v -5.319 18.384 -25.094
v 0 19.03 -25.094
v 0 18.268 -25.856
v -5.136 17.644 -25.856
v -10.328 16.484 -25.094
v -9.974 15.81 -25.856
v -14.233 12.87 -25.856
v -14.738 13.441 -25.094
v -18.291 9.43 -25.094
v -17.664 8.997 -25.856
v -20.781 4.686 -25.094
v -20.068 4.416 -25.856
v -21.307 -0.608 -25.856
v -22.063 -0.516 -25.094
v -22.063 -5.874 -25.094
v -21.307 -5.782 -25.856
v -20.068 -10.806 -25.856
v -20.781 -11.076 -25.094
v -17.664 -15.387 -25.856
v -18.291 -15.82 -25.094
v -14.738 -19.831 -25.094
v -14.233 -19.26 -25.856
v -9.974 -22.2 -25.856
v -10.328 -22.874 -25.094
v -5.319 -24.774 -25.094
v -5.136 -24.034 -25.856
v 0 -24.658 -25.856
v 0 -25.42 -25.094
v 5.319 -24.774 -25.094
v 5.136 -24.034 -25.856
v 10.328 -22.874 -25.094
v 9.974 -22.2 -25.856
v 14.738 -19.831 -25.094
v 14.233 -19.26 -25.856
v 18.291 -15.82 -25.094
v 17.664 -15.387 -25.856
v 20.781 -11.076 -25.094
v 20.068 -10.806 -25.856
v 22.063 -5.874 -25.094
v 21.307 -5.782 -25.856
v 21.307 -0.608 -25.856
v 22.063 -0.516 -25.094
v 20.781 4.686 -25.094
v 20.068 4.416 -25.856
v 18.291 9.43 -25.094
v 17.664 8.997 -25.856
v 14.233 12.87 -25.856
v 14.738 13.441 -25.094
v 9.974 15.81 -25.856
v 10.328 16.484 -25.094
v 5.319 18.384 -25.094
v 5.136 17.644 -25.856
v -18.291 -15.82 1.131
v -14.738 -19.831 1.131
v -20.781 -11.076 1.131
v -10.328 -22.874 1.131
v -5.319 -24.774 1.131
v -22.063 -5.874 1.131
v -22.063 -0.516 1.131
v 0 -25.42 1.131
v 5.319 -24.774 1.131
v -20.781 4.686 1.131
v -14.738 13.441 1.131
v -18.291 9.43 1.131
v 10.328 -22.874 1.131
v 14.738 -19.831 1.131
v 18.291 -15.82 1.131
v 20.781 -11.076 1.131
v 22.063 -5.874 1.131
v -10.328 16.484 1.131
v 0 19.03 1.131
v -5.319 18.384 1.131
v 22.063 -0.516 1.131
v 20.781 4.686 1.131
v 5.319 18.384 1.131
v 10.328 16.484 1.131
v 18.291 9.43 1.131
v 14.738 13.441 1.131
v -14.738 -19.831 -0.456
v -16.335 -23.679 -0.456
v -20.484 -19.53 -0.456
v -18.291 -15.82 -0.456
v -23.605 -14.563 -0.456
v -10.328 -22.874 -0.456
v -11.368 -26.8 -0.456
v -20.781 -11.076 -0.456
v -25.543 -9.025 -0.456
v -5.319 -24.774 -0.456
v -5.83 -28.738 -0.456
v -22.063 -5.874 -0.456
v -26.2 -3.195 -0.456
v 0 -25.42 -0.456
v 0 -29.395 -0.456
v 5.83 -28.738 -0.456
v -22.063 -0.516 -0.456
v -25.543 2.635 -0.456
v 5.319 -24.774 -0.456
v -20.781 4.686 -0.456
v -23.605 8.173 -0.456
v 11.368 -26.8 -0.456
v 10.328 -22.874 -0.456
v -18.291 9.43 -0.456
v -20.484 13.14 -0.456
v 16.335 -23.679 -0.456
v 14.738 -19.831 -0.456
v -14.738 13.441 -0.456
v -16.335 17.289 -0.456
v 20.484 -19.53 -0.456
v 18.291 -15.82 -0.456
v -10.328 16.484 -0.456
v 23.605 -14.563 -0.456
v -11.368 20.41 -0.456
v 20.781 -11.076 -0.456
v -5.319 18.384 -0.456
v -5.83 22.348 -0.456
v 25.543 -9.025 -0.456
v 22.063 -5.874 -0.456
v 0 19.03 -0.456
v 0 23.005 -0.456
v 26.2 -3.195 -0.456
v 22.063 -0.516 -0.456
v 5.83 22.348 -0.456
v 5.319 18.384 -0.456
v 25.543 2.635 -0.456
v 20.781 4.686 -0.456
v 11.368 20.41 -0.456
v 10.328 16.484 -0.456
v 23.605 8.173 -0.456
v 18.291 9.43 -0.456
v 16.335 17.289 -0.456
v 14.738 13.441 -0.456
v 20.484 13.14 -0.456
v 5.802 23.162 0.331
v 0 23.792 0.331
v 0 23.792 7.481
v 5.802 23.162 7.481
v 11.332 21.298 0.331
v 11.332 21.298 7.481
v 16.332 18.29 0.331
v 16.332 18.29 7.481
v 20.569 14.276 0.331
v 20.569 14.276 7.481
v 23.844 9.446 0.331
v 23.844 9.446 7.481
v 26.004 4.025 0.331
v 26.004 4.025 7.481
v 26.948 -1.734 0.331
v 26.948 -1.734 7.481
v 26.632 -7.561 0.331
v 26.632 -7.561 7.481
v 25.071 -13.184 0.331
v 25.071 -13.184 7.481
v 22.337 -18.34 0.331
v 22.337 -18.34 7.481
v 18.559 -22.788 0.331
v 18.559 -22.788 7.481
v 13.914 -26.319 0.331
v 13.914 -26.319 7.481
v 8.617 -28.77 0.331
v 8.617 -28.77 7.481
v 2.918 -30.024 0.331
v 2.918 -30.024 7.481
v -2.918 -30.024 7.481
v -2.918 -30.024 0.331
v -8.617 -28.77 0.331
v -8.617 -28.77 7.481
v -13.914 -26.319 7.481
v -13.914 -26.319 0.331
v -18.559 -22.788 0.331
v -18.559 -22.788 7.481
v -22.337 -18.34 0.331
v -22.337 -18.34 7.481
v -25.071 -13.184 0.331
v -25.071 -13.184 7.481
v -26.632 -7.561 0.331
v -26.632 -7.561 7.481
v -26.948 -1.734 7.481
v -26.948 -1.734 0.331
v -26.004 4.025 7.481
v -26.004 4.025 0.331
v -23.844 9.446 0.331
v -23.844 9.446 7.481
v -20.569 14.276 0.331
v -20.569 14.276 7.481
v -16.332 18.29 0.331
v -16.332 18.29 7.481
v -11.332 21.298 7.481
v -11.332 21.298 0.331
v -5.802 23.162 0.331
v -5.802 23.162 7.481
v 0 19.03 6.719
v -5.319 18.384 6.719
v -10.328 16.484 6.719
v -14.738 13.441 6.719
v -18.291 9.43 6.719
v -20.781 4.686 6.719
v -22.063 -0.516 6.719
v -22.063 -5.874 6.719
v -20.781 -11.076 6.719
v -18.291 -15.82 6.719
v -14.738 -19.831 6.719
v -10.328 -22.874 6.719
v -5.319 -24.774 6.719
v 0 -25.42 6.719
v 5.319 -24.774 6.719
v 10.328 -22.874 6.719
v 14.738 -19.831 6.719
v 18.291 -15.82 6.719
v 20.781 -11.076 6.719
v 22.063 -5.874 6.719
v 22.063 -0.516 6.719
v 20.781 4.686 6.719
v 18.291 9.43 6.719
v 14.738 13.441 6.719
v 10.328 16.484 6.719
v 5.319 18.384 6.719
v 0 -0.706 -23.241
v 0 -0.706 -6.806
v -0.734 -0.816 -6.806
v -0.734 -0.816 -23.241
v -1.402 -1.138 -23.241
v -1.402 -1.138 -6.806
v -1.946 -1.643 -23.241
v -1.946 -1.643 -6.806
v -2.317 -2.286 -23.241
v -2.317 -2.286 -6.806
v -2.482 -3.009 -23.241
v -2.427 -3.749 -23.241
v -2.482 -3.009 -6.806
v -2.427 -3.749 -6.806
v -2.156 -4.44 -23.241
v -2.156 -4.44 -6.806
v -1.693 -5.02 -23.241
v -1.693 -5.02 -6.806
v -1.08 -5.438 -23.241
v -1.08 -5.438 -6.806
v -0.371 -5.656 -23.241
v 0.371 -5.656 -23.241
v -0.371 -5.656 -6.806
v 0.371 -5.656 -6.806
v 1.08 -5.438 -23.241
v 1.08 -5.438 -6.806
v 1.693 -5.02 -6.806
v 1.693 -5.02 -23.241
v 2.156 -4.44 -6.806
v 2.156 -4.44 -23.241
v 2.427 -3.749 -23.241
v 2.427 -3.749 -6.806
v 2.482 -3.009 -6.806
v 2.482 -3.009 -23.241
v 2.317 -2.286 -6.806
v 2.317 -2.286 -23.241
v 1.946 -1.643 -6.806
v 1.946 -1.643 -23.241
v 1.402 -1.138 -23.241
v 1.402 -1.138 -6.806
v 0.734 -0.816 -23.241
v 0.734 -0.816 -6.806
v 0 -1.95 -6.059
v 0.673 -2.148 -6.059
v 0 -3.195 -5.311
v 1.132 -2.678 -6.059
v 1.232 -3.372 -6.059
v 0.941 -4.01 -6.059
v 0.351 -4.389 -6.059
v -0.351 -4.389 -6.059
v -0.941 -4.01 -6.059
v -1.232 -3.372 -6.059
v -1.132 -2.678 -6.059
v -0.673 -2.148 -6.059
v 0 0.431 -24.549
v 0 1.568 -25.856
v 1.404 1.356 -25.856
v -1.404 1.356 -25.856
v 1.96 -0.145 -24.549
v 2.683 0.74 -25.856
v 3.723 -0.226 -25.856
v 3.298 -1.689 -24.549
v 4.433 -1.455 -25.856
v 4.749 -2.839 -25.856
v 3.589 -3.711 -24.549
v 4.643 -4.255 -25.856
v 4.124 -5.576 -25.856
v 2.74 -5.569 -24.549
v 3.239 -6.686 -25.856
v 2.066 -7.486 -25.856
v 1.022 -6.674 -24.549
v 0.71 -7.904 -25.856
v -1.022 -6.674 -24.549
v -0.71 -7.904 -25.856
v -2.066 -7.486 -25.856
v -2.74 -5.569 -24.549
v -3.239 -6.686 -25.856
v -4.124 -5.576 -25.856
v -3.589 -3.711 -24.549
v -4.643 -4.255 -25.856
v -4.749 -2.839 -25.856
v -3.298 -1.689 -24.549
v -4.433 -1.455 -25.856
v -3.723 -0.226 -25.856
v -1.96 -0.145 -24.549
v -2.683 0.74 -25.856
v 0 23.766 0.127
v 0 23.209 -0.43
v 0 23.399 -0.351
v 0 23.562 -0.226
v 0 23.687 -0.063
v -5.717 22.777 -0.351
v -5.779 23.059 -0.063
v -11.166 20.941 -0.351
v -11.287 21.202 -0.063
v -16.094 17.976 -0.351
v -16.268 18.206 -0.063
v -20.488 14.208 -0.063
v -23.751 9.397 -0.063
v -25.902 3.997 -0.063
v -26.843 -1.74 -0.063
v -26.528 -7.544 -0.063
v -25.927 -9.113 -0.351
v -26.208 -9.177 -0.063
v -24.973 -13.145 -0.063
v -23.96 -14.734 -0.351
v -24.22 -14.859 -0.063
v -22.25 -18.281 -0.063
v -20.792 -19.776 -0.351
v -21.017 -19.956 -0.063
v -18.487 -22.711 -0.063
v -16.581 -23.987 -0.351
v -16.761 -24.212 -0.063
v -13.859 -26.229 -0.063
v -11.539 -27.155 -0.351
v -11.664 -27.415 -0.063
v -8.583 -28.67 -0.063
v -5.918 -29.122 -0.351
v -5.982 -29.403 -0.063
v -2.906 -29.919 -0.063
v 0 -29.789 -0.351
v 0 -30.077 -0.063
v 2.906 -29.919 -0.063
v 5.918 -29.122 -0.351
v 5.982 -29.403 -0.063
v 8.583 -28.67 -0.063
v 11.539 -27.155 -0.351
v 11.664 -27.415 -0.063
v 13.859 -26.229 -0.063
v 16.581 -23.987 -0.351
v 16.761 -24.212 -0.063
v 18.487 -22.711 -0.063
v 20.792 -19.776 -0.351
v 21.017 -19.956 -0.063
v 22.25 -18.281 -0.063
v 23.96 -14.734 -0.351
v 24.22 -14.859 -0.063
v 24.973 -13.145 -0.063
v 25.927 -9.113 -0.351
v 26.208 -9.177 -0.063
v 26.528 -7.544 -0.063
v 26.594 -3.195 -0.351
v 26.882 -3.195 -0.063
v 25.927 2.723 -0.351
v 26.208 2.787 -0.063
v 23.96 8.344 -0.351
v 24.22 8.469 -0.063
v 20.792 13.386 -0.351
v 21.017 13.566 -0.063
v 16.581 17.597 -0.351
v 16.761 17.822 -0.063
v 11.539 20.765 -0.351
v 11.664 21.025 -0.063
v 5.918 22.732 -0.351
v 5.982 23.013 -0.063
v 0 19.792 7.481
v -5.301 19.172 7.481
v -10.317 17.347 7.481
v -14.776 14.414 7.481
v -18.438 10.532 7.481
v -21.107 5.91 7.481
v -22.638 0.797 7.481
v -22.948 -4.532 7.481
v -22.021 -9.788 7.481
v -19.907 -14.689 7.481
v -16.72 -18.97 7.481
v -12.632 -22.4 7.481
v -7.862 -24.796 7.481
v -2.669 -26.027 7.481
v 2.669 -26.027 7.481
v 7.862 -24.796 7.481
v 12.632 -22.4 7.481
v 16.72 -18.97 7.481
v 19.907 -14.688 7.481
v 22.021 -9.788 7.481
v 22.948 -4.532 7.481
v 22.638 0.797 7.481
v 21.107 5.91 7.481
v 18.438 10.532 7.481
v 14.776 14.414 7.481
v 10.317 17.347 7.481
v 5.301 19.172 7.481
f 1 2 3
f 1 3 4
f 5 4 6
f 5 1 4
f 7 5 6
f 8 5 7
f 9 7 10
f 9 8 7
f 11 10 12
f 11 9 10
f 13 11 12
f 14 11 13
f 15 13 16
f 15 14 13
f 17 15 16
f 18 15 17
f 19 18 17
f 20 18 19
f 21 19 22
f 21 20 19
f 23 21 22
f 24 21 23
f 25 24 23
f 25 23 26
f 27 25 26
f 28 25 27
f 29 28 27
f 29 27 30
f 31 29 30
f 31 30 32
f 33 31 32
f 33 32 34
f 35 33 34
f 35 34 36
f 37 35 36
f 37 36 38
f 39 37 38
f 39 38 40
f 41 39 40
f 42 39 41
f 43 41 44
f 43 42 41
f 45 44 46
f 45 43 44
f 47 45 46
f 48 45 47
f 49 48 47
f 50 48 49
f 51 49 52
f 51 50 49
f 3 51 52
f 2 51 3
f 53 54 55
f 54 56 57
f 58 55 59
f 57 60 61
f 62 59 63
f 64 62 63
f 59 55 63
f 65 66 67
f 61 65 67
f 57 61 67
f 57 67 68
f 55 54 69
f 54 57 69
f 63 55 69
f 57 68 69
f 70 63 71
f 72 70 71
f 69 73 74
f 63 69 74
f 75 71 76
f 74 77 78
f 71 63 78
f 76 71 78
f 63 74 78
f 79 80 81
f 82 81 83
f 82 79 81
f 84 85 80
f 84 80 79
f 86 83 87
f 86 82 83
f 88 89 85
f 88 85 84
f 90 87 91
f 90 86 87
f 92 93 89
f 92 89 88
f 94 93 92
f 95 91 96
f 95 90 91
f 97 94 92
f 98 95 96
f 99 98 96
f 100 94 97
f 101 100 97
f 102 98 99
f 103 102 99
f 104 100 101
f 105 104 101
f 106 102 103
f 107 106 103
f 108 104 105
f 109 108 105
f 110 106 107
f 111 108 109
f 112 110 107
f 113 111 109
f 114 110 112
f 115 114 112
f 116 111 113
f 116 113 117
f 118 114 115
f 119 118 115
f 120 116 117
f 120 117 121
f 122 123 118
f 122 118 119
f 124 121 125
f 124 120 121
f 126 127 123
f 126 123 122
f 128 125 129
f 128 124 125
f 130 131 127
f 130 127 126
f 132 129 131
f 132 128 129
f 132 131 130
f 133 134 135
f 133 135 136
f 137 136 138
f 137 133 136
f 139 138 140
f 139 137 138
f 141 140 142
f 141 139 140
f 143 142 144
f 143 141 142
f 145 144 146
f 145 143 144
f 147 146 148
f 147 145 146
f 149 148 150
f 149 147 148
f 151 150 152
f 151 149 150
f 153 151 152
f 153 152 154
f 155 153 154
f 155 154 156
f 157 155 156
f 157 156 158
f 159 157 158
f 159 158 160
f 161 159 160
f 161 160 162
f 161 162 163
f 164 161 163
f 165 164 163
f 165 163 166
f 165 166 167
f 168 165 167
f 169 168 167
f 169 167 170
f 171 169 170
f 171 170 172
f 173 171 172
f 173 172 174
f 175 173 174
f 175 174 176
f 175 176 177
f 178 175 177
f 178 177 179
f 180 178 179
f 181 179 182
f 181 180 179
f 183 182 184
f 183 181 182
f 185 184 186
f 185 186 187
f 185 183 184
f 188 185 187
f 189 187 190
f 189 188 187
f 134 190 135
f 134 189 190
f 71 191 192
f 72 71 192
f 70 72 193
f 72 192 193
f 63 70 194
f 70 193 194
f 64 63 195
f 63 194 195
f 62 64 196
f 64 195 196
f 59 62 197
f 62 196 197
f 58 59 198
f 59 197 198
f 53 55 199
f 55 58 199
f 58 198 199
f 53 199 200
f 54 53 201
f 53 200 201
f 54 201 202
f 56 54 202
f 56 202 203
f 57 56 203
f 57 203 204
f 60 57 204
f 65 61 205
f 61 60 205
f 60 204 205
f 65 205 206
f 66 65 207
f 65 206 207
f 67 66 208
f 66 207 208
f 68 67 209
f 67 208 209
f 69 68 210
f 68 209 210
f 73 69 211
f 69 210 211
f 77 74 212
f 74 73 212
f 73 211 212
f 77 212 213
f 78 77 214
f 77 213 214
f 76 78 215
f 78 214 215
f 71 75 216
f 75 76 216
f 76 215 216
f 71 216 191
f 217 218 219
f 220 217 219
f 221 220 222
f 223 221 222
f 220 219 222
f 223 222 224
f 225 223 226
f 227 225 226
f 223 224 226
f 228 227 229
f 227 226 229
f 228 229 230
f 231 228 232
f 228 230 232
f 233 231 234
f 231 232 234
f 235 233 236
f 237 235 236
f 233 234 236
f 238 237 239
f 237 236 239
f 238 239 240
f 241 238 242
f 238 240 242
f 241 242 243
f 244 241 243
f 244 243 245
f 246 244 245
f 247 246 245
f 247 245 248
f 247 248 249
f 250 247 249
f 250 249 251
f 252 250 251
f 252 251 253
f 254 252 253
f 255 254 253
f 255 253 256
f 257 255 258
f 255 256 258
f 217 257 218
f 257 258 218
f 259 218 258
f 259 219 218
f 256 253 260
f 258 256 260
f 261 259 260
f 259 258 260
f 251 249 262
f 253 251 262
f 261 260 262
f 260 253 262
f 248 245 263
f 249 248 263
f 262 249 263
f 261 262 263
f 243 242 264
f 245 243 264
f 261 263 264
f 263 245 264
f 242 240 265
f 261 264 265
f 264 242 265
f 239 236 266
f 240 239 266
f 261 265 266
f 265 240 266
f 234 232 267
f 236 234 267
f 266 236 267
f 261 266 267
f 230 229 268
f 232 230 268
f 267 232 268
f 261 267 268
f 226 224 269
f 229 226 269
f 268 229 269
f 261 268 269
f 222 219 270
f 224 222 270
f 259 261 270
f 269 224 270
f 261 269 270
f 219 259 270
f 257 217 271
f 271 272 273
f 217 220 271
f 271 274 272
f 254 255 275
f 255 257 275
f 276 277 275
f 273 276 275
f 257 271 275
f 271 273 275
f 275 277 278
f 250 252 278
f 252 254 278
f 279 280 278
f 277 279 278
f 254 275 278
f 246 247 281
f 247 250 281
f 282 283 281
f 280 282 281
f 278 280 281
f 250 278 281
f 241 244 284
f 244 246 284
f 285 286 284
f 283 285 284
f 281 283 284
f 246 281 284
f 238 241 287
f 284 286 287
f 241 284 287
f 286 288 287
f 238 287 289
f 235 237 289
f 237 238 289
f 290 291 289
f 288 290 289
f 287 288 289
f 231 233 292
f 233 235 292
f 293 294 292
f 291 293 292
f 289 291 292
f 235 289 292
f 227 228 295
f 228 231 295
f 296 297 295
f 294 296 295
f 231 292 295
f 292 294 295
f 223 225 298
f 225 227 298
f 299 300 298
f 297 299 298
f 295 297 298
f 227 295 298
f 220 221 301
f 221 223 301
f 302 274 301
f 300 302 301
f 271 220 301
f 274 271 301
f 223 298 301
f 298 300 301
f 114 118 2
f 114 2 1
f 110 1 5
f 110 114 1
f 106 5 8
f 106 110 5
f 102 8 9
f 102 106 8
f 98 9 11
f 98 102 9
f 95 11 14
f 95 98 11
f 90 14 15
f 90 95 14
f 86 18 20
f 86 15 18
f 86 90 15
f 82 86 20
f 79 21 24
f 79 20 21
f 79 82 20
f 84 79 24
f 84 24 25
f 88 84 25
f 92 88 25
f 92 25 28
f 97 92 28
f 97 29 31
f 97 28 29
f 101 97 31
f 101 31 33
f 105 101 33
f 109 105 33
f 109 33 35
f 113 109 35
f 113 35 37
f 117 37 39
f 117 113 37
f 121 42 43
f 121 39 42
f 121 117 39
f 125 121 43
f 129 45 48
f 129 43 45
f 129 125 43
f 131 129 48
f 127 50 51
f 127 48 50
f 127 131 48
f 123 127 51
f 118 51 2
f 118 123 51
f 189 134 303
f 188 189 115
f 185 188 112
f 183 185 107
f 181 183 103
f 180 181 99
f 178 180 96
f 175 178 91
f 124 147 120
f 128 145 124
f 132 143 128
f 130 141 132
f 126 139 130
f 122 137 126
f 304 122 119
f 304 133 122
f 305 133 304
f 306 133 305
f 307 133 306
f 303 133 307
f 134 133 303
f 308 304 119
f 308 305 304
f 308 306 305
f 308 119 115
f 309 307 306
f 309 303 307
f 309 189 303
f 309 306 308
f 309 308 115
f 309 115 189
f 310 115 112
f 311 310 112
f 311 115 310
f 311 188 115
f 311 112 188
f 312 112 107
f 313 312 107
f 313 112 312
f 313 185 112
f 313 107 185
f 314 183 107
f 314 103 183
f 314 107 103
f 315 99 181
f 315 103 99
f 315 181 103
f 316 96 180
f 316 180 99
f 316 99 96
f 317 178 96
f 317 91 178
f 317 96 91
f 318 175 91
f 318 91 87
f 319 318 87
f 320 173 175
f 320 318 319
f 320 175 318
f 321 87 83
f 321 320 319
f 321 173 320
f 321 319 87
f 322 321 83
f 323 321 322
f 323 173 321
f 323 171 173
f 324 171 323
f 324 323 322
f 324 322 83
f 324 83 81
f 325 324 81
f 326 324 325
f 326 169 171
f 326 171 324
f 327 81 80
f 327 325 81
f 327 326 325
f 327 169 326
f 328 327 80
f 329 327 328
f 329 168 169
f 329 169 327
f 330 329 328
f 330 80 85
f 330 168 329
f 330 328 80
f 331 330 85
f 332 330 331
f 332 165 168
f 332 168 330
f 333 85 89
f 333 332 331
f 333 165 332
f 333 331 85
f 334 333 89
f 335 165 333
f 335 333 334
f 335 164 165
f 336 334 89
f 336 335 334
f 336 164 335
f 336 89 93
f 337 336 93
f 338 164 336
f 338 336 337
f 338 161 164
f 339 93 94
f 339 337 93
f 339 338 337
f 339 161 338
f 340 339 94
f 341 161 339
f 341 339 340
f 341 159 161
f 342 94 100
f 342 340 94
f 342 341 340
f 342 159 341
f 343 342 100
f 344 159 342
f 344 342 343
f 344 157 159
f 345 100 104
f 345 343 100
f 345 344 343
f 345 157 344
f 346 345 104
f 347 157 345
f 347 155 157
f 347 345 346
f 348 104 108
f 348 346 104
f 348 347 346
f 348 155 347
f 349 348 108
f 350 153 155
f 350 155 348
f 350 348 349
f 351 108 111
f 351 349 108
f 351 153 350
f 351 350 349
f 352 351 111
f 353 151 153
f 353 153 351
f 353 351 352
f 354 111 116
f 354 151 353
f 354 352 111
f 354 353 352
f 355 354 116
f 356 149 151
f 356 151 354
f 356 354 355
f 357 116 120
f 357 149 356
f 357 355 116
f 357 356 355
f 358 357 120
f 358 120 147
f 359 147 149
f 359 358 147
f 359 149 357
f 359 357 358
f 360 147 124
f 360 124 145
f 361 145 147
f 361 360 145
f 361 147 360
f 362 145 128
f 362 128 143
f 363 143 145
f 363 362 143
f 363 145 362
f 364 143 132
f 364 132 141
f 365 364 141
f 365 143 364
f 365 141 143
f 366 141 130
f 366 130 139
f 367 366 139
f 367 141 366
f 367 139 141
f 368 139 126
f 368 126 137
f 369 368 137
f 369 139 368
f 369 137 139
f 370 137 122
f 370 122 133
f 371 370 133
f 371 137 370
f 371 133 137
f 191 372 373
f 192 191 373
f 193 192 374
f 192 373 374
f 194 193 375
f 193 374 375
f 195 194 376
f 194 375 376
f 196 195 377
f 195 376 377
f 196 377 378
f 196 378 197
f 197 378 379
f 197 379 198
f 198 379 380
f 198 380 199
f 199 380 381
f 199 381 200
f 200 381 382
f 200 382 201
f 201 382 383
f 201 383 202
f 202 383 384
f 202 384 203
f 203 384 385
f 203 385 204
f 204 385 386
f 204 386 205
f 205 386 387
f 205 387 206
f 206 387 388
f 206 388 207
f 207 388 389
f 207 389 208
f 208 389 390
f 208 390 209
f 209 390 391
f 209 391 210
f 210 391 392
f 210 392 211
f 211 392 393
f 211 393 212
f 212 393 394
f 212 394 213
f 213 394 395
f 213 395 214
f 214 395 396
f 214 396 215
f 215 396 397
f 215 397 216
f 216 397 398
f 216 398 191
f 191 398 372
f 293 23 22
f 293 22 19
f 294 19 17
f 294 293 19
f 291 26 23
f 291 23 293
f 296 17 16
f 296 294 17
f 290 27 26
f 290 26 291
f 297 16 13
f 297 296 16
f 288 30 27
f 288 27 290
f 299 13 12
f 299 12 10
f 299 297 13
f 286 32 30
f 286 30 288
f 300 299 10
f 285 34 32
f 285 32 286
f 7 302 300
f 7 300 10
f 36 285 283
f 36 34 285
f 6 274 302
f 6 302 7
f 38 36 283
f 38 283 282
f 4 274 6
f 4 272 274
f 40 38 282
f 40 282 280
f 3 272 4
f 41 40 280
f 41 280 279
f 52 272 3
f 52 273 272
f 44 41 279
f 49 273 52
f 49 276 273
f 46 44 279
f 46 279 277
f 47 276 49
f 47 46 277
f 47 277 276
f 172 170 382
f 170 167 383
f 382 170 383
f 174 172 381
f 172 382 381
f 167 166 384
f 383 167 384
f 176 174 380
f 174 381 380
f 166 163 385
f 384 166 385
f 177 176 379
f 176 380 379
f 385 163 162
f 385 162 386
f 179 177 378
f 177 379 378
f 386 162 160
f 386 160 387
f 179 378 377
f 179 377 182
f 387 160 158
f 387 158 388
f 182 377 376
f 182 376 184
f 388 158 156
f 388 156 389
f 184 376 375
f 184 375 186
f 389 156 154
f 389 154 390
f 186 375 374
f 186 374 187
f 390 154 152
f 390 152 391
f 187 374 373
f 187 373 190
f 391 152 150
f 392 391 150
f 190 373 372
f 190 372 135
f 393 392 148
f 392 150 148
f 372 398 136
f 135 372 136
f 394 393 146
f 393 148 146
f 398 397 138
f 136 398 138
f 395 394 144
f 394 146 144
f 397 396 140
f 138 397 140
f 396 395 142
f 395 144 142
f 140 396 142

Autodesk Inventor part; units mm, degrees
ref_plane "YZ Plane" through (0, 0, 0) normal (1, 0, 0) x (0, 1, 0)
ref_plane "XZ Plane" through (0, 0, 0) normal (0, 1, 0) x (-1, 0, 0)
ref_plane "XY Plane" through (0, 0, 0) normal (0, 0, 1) x (1, 0, 0)
sketch "Sketch1" plane through (0, 0, 0) normal (1, 0, 0) x (0, 1, 0)
  line L0 (-3.195, -4.0211) -> (-3.195, -25.8564)
  line L1 (-3.195, -25.8564) -> (19.03, -25.8564)
  line L2 (19.03, -25.8564) -> (19.03, -0.4564)
  line L3 (19.03, -0.4564) -> (23.7925, -0.4564)
  line L4 (23.7925, -0.4564) -> (23.7925, 0)
  line L5 (19.03, 1.1311) -> (-3.195, 1.1311)
  line L6 (-3.195, 1.1311) -> (-3.195, -4.0211)
  line L7 (19.03, 1.1311) -> (19.03, 7.4811)
  line L8 (19.03, 7.4811) -> (23.7925, 7.4811)
  line L9 (23.7925, 7.4811) -> (23.7925, 0)
  dimension "d1" = 4.7625
  dimension "d2" = 7.9375
  dimension "d3" = 6.35
  dimension "d5" = 26.9875
  dimension "d6" = 22.225
revolve "Revolution1" add sketch "Sketch1" angle 360 about axis through (0, -3.195, -4.0211) along (0, 0, -1)
sketch "Sketch2" plane through (0, -3.195, -25.8564) normal (0, 0, -1) x (-1, 0, 0)
  point P0 (0, 3.195)
sketch "Sketch3" plane through (0, -3.195, -25.8564) normal (0, 0, -1) x (-1, 0, 0)
  point P0 (0, 3.195)
  point P1 (0, 0)
hole "Hole1" at (0, -3.195, -25.8564) direction (0, 0, 1) diameter 4.9784 depth 19.05 tip angle 118 countersink diameter 9.525 countersink angle 82 thread size "1/4-20 UNC" class "2B" standard "ANSI Unified Screw Threads"
chamfer "Chamfer1" distance 0.762 angle 45 1 edges at (0, -25.42, 7.4811) measured on face at (-3.9258, 21.7283, 7.4811)
chamfer "Chamfer2" distance 0.762 angle 45 1 edges at (0, -25.42, -25.8564) measured on face at (-2.1528, 12.9477, -25.8564)
fillet "Fillet1" radius 0.7874 1 edges at (0, -30.1825, -0.4564)
properties part number "Loer die 2 center" material "Steel"
